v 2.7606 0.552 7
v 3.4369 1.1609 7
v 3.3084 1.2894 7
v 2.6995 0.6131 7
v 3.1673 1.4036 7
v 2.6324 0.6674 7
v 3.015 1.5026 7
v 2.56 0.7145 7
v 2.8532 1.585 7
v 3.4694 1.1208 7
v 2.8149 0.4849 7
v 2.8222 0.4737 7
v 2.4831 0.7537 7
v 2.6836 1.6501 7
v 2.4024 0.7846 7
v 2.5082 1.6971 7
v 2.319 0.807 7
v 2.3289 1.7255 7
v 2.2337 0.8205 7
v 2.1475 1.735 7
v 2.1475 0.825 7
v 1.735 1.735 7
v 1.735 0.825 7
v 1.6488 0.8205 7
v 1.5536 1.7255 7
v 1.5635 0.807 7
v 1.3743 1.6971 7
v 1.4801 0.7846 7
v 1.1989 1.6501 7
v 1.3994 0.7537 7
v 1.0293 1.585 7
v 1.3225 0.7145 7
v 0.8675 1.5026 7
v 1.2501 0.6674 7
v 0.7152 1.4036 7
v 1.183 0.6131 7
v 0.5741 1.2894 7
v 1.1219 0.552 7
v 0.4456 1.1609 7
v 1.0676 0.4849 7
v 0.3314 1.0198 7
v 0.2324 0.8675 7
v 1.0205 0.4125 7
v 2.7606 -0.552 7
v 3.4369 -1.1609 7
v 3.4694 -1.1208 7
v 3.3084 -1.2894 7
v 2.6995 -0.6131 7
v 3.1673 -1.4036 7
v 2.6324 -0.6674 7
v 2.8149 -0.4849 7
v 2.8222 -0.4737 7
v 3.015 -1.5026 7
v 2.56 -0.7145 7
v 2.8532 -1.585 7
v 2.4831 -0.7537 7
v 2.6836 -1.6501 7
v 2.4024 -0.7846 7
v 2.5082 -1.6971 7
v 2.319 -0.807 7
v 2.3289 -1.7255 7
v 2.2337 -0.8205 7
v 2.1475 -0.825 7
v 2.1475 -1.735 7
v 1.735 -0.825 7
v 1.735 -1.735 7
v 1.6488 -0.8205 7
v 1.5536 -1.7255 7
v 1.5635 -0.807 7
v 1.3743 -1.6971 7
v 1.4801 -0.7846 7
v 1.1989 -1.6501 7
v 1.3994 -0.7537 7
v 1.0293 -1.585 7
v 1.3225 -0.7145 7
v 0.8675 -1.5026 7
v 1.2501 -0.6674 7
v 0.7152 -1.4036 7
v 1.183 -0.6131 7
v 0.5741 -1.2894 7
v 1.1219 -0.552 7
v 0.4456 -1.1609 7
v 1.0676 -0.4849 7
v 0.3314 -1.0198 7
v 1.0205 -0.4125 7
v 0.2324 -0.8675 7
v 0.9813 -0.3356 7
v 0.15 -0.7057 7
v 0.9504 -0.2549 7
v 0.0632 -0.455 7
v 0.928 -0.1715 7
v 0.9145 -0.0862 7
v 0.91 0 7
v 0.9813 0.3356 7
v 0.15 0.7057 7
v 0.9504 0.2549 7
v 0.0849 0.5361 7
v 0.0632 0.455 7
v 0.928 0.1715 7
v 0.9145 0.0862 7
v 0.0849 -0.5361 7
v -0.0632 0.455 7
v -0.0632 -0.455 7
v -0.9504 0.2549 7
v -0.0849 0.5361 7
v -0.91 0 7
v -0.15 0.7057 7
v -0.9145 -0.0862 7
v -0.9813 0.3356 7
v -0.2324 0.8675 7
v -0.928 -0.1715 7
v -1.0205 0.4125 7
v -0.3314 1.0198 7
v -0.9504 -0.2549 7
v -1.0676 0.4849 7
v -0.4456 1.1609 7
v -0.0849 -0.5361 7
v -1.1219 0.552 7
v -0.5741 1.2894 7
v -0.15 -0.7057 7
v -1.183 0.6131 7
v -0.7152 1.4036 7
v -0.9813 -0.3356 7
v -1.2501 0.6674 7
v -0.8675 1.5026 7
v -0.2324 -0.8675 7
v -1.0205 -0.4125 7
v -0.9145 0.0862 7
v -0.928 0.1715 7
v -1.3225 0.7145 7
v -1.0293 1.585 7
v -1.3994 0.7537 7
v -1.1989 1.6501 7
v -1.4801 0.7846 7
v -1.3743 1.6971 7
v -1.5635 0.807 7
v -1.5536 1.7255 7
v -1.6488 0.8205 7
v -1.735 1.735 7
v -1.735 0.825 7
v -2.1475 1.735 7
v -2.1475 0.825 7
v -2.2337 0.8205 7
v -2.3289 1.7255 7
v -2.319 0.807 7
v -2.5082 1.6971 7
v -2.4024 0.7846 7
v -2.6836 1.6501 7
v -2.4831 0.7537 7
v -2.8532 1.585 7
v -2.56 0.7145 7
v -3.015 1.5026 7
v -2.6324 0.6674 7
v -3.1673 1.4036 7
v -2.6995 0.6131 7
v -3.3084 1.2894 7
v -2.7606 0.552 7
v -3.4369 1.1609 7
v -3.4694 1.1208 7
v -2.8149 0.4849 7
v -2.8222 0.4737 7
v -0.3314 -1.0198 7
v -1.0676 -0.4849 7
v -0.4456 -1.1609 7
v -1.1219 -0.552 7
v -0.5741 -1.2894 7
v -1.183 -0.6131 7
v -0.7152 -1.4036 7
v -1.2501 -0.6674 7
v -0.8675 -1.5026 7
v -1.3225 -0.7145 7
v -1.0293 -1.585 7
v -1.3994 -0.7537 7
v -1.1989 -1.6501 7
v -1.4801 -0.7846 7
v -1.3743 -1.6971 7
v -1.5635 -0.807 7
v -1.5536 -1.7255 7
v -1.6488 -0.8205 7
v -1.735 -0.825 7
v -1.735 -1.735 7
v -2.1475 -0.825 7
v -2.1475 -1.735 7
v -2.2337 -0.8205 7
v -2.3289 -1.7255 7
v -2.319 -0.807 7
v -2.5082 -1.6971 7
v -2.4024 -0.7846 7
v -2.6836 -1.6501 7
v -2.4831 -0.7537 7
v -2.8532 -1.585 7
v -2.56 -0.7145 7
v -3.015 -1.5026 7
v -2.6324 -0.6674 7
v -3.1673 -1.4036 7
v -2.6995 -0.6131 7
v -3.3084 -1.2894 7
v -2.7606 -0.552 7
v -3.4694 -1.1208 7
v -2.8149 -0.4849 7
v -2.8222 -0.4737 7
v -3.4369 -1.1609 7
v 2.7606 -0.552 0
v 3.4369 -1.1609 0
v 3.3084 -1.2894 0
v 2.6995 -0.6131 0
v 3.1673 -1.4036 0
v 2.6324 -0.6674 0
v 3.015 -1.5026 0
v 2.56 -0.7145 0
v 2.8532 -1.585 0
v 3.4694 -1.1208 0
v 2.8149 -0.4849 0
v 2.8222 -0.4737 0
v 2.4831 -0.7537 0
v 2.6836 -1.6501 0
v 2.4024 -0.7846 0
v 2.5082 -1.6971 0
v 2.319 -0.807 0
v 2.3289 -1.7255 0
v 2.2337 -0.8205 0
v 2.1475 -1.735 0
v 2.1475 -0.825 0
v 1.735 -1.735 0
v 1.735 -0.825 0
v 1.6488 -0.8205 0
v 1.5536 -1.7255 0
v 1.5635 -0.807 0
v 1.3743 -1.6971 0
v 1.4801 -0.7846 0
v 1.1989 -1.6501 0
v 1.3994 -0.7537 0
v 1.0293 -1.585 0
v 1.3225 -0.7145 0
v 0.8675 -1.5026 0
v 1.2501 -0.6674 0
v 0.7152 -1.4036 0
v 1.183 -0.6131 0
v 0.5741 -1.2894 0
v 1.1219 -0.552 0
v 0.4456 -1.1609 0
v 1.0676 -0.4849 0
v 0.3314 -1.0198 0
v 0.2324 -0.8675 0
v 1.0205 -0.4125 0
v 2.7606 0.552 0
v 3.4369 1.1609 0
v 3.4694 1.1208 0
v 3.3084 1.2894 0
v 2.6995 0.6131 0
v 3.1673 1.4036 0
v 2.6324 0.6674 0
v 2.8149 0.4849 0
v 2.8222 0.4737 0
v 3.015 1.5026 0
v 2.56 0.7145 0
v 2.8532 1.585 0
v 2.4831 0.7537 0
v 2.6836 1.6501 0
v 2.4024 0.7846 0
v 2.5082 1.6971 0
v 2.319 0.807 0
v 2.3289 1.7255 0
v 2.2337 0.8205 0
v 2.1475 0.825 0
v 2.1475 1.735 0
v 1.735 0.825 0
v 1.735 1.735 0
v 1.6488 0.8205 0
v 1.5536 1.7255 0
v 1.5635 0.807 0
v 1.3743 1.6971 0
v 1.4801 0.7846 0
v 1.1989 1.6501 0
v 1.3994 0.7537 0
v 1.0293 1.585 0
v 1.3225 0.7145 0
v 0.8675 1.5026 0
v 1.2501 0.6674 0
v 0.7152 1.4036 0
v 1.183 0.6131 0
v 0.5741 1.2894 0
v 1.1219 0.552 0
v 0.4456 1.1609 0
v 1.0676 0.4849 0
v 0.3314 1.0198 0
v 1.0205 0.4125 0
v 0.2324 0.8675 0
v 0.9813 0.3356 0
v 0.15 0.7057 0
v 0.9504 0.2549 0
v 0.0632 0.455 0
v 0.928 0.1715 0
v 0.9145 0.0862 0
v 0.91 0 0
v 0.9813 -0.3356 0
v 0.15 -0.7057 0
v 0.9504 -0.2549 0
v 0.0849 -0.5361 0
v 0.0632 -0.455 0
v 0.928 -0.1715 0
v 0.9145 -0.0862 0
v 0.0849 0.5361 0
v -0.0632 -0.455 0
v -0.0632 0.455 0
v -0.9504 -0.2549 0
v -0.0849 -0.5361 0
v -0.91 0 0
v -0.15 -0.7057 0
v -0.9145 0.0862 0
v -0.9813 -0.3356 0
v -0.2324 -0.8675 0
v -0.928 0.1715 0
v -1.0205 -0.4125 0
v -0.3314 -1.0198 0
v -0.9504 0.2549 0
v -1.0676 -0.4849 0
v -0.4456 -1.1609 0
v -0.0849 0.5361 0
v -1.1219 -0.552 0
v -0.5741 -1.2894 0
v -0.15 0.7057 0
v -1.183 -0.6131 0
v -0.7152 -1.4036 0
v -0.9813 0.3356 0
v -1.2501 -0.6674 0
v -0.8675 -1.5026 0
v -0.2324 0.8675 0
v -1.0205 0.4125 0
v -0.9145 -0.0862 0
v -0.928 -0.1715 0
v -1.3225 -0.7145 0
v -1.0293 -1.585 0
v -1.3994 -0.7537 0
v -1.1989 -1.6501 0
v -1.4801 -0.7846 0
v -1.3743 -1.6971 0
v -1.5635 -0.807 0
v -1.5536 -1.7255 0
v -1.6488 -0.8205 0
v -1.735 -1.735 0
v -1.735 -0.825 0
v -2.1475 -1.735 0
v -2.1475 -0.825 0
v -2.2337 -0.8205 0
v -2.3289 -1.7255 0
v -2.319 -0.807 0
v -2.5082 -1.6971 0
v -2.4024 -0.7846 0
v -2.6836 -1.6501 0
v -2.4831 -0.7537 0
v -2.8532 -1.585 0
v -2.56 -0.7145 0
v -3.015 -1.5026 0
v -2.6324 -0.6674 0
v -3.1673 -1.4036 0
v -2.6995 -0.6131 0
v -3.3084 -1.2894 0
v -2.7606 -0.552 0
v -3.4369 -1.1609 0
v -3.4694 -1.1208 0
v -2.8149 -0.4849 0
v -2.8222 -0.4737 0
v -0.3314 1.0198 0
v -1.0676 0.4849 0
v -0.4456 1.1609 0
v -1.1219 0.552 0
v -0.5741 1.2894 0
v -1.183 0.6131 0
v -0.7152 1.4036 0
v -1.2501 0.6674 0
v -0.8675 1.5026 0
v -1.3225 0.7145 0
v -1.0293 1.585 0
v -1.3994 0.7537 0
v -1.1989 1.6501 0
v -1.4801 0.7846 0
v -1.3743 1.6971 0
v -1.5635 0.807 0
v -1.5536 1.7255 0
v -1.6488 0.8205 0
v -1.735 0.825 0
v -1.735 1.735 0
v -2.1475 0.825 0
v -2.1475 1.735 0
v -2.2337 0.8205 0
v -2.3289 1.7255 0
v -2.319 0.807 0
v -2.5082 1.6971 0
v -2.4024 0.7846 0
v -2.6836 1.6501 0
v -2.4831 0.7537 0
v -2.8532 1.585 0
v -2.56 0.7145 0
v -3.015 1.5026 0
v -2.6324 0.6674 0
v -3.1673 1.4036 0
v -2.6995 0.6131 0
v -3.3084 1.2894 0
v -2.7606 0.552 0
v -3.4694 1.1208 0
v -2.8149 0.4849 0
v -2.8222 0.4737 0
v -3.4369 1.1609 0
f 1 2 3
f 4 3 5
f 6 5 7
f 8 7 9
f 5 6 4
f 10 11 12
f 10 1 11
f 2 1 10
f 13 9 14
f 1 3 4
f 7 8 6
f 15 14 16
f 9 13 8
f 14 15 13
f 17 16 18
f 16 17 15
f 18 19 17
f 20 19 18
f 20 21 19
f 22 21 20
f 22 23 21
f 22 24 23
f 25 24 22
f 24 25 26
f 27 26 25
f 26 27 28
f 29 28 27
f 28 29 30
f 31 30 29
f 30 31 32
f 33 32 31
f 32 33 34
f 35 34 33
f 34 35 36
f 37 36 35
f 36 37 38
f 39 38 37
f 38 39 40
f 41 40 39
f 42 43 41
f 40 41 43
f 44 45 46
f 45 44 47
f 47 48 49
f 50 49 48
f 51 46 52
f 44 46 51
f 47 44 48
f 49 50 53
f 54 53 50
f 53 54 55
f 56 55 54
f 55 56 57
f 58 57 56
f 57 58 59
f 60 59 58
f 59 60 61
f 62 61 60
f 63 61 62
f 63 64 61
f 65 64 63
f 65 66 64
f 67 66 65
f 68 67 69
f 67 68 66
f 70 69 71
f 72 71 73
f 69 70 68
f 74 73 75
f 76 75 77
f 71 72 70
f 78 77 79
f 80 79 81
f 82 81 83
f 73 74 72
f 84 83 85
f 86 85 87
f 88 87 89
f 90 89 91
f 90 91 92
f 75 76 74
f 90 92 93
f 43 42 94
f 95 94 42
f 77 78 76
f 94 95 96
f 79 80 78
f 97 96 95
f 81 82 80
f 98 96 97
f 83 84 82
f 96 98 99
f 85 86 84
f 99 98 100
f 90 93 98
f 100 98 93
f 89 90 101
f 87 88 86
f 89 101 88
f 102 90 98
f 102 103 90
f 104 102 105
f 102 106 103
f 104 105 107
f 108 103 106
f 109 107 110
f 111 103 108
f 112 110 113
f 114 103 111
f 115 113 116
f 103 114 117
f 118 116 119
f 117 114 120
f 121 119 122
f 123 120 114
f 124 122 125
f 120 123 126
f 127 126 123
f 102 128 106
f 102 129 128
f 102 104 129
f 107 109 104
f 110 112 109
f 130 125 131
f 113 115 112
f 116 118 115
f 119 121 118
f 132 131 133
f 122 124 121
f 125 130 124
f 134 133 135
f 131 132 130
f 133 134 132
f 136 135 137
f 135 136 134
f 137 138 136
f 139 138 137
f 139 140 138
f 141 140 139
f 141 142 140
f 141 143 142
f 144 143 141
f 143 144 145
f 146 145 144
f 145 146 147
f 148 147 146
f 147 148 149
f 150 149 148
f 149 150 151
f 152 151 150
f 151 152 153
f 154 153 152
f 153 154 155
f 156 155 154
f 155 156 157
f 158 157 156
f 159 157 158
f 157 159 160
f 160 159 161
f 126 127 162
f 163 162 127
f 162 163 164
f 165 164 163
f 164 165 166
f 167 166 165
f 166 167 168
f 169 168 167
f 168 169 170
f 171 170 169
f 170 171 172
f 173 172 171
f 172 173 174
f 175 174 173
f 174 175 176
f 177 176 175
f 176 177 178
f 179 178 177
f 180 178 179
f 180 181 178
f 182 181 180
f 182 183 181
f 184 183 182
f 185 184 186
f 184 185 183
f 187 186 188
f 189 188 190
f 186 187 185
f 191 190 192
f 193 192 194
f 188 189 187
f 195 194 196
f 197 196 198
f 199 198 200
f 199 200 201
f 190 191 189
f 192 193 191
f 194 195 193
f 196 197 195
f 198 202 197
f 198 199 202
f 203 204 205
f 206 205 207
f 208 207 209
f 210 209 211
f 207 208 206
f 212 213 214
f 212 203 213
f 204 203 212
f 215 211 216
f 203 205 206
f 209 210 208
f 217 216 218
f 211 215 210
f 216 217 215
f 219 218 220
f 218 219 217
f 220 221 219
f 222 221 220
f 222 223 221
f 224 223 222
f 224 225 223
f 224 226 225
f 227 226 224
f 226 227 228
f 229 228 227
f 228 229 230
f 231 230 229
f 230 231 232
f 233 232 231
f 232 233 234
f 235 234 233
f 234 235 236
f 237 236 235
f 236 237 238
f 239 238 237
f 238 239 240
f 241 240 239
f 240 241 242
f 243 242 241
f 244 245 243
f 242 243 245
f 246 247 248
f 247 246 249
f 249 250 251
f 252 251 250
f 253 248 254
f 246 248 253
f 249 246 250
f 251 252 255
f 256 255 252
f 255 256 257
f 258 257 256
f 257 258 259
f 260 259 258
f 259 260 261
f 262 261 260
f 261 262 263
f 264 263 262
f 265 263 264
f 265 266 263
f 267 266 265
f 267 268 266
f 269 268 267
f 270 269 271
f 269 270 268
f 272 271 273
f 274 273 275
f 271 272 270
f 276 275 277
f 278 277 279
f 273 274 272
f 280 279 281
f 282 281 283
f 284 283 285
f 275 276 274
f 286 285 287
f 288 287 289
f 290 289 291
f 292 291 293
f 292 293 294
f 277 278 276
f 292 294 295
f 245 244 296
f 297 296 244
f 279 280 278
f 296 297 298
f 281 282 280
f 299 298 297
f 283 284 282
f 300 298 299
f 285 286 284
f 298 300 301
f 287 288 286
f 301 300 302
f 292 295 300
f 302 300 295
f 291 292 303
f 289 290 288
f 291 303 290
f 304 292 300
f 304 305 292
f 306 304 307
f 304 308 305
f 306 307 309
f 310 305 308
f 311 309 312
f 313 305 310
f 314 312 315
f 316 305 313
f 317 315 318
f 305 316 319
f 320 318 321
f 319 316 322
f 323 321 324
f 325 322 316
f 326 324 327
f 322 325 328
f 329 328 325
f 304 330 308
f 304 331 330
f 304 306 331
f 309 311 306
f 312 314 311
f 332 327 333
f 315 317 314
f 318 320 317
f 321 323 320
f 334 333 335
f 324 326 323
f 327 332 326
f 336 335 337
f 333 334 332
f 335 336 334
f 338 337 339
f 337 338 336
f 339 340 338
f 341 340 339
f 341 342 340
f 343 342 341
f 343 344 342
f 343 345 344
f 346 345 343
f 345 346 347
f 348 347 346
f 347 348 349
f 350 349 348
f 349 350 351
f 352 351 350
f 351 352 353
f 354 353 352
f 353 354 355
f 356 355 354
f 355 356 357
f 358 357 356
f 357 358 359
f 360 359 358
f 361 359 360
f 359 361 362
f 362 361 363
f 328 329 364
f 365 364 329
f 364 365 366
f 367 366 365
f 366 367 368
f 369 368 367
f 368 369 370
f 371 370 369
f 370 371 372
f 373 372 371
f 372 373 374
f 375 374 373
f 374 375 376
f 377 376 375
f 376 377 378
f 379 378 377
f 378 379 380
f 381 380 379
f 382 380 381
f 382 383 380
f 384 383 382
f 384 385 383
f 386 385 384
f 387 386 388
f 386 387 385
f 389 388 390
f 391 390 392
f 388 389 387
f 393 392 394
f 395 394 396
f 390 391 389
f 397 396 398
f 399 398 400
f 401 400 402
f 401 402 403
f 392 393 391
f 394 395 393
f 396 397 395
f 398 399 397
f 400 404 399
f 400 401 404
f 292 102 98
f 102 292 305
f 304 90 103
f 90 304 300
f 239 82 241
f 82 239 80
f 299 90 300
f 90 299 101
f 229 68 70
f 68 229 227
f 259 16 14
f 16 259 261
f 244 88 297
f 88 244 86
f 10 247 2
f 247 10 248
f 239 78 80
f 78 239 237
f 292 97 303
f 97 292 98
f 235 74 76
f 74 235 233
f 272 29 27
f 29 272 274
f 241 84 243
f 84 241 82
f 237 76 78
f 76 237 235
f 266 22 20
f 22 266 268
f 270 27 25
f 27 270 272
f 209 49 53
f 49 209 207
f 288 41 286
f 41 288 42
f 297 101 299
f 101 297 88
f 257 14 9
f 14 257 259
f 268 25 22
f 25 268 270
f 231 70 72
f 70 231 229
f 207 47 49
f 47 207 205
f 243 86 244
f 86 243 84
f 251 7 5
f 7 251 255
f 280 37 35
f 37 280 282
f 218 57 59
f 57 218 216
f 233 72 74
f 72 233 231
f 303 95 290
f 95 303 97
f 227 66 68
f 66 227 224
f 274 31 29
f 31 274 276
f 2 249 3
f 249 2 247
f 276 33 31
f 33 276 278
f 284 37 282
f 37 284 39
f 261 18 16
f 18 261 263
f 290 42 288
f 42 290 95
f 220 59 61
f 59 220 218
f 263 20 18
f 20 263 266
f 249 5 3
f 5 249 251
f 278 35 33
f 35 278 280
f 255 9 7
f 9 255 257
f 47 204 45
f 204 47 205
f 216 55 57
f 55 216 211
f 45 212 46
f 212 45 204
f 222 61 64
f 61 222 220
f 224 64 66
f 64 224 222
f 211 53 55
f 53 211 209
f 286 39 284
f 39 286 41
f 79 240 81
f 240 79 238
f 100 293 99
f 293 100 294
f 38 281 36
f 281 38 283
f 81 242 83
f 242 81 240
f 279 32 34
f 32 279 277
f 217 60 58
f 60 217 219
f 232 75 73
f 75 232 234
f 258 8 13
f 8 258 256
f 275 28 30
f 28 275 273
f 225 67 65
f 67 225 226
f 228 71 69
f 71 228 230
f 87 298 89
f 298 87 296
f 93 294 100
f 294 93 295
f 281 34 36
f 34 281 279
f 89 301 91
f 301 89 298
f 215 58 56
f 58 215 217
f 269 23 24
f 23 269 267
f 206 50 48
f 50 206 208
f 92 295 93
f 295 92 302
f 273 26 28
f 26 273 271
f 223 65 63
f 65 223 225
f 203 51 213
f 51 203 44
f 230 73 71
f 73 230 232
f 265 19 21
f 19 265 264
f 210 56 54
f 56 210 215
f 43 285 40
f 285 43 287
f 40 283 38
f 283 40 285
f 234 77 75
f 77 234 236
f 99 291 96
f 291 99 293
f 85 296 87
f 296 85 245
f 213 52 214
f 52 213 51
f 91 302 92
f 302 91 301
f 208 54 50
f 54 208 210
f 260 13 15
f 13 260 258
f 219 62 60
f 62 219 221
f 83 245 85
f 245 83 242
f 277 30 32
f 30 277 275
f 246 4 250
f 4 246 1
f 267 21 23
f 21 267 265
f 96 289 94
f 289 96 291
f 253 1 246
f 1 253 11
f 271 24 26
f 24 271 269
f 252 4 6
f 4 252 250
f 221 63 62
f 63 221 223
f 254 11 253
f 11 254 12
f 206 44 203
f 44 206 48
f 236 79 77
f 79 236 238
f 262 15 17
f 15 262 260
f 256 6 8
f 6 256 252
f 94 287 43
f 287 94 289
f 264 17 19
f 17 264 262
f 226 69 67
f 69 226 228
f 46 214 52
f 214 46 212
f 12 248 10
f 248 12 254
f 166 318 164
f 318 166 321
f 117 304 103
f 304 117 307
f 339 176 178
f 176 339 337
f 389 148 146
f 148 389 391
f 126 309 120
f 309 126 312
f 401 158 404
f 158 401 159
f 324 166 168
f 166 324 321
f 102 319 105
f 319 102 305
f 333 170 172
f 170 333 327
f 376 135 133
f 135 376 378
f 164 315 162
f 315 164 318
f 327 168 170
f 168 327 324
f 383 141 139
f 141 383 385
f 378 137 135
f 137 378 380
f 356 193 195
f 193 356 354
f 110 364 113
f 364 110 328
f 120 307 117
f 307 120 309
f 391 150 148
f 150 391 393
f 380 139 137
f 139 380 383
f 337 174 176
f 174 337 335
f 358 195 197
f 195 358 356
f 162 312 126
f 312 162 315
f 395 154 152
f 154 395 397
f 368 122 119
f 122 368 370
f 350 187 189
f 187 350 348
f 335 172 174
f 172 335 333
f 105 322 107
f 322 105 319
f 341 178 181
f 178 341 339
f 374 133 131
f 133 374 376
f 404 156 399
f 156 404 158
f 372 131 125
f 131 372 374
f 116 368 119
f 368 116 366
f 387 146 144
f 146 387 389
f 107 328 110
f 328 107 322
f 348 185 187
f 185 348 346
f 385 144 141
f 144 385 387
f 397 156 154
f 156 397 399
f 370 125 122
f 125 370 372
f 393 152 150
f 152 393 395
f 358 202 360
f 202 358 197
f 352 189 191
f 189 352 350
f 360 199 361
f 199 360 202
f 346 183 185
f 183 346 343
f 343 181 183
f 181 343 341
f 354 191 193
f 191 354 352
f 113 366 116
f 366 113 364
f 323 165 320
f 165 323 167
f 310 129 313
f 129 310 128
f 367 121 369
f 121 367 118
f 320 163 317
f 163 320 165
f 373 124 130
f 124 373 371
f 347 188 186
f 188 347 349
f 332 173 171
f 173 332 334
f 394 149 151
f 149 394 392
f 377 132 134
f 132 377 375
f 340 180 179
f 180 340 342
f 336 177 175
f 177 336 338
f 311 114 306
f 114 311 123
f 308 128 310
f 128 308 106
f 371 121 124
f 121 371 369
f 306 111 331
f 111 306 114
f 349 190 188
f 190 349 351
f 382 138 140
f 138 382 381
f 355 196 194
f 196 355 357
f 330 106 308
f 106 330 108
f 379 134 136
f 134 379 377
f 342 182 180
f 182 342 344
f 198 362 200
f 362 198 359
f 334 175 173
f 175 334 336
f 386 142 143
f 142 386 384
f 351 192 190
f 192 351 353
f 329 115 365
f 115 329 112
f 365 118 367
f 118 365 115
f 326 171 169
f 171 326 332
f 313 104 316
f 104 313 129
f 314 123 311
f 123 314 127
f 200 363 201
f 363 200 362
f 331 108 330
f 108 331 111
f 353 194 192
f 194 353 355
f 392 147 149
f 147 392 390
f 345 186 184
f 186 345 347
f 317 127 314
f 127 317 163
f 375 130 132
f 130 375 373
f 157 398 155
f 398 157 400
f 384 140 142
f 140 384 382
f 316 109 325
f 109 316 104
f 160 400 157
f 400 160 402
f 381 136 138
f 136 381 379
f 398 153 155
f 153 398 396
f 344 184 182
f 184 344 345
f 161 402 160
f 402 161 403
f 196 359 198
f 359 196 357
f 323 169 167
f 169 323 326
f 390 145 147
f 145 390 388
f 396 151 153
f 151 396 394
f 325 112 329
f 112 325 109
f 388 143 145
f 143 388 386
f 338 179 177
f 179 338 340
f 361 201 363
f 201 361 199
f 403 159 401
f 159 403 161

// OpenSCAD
//////////////////////////////////////////////////////////////////
// Double-sided filament clip - securely grips both strands
//
// Remixed from: Universal 1.75mm filament clip by mpmselenic
//               Published on March 9, 2017
//               www.thingiverse.com/thing:2166143
//////////////////////////////////////////////////////////////////

// Parameters

// Nominal filament dia in mm (Typicallly 1.75 or 2.85)
filament_dia    = 1.75;
// offset in mm - typically slightly negative to lighty grip filament (-0.1)
offset             = -0.1;    
// Wall thickness. Cura seems to not produce full curved walls at 0.8mm?
thick           = 0.91;     
// height of extrusion
height          = 7;

// Derived variables
inner_r = (filament_dia + offset)/2;
spacing = inner_r * 0.5;        // depth of throat bigger than diameter to allow curvature and better retention
outer_r = inner_r + thick;

$fn=60*1;

// Objects

// fuse 2 "C" clips back-to-back
union() {    
    translate ([+outer_r,0,0]) c_clip();
    mirror ([1,0,0]) translate ([+outer_r,0,0]) c_clip();
}

module c_clip() {
    difference() {
      union() {
        // handle
        translate([-(spacing+outer_r),-thick/2,0])
            cube([thick*2,thick, height]);
        
        // Outer shell
        hull() {
          cylinder(h=height, r1=outer_r, r2=outer_r);
          translate([spacing,0,0])
            cylinder(h=height, r1=outer_r, r2=outer_r);
        }
      }
      
      // Make subtractive objects +2 taller and offset by -1 in z to avoid conincdent faces 
      // screwing up preview or causing non-manifold objects
      
      // inner oval
      hull() {
        translate ([0,0,-1]) cylinder(h=height+2, r1=inner_r, r2=inner_r);
        translate([spacing,0,-1])
            cylinder(h=height+2, r1=inner_r, r2=inner_r);
      }
      
      // notch in end
      translate([spacing+0.2+10/1.414,0,0])
        rotate([0,0,45])
            translate([-5,-5,-1])
                cube([10,10,height+2], center=1);
    }
}
